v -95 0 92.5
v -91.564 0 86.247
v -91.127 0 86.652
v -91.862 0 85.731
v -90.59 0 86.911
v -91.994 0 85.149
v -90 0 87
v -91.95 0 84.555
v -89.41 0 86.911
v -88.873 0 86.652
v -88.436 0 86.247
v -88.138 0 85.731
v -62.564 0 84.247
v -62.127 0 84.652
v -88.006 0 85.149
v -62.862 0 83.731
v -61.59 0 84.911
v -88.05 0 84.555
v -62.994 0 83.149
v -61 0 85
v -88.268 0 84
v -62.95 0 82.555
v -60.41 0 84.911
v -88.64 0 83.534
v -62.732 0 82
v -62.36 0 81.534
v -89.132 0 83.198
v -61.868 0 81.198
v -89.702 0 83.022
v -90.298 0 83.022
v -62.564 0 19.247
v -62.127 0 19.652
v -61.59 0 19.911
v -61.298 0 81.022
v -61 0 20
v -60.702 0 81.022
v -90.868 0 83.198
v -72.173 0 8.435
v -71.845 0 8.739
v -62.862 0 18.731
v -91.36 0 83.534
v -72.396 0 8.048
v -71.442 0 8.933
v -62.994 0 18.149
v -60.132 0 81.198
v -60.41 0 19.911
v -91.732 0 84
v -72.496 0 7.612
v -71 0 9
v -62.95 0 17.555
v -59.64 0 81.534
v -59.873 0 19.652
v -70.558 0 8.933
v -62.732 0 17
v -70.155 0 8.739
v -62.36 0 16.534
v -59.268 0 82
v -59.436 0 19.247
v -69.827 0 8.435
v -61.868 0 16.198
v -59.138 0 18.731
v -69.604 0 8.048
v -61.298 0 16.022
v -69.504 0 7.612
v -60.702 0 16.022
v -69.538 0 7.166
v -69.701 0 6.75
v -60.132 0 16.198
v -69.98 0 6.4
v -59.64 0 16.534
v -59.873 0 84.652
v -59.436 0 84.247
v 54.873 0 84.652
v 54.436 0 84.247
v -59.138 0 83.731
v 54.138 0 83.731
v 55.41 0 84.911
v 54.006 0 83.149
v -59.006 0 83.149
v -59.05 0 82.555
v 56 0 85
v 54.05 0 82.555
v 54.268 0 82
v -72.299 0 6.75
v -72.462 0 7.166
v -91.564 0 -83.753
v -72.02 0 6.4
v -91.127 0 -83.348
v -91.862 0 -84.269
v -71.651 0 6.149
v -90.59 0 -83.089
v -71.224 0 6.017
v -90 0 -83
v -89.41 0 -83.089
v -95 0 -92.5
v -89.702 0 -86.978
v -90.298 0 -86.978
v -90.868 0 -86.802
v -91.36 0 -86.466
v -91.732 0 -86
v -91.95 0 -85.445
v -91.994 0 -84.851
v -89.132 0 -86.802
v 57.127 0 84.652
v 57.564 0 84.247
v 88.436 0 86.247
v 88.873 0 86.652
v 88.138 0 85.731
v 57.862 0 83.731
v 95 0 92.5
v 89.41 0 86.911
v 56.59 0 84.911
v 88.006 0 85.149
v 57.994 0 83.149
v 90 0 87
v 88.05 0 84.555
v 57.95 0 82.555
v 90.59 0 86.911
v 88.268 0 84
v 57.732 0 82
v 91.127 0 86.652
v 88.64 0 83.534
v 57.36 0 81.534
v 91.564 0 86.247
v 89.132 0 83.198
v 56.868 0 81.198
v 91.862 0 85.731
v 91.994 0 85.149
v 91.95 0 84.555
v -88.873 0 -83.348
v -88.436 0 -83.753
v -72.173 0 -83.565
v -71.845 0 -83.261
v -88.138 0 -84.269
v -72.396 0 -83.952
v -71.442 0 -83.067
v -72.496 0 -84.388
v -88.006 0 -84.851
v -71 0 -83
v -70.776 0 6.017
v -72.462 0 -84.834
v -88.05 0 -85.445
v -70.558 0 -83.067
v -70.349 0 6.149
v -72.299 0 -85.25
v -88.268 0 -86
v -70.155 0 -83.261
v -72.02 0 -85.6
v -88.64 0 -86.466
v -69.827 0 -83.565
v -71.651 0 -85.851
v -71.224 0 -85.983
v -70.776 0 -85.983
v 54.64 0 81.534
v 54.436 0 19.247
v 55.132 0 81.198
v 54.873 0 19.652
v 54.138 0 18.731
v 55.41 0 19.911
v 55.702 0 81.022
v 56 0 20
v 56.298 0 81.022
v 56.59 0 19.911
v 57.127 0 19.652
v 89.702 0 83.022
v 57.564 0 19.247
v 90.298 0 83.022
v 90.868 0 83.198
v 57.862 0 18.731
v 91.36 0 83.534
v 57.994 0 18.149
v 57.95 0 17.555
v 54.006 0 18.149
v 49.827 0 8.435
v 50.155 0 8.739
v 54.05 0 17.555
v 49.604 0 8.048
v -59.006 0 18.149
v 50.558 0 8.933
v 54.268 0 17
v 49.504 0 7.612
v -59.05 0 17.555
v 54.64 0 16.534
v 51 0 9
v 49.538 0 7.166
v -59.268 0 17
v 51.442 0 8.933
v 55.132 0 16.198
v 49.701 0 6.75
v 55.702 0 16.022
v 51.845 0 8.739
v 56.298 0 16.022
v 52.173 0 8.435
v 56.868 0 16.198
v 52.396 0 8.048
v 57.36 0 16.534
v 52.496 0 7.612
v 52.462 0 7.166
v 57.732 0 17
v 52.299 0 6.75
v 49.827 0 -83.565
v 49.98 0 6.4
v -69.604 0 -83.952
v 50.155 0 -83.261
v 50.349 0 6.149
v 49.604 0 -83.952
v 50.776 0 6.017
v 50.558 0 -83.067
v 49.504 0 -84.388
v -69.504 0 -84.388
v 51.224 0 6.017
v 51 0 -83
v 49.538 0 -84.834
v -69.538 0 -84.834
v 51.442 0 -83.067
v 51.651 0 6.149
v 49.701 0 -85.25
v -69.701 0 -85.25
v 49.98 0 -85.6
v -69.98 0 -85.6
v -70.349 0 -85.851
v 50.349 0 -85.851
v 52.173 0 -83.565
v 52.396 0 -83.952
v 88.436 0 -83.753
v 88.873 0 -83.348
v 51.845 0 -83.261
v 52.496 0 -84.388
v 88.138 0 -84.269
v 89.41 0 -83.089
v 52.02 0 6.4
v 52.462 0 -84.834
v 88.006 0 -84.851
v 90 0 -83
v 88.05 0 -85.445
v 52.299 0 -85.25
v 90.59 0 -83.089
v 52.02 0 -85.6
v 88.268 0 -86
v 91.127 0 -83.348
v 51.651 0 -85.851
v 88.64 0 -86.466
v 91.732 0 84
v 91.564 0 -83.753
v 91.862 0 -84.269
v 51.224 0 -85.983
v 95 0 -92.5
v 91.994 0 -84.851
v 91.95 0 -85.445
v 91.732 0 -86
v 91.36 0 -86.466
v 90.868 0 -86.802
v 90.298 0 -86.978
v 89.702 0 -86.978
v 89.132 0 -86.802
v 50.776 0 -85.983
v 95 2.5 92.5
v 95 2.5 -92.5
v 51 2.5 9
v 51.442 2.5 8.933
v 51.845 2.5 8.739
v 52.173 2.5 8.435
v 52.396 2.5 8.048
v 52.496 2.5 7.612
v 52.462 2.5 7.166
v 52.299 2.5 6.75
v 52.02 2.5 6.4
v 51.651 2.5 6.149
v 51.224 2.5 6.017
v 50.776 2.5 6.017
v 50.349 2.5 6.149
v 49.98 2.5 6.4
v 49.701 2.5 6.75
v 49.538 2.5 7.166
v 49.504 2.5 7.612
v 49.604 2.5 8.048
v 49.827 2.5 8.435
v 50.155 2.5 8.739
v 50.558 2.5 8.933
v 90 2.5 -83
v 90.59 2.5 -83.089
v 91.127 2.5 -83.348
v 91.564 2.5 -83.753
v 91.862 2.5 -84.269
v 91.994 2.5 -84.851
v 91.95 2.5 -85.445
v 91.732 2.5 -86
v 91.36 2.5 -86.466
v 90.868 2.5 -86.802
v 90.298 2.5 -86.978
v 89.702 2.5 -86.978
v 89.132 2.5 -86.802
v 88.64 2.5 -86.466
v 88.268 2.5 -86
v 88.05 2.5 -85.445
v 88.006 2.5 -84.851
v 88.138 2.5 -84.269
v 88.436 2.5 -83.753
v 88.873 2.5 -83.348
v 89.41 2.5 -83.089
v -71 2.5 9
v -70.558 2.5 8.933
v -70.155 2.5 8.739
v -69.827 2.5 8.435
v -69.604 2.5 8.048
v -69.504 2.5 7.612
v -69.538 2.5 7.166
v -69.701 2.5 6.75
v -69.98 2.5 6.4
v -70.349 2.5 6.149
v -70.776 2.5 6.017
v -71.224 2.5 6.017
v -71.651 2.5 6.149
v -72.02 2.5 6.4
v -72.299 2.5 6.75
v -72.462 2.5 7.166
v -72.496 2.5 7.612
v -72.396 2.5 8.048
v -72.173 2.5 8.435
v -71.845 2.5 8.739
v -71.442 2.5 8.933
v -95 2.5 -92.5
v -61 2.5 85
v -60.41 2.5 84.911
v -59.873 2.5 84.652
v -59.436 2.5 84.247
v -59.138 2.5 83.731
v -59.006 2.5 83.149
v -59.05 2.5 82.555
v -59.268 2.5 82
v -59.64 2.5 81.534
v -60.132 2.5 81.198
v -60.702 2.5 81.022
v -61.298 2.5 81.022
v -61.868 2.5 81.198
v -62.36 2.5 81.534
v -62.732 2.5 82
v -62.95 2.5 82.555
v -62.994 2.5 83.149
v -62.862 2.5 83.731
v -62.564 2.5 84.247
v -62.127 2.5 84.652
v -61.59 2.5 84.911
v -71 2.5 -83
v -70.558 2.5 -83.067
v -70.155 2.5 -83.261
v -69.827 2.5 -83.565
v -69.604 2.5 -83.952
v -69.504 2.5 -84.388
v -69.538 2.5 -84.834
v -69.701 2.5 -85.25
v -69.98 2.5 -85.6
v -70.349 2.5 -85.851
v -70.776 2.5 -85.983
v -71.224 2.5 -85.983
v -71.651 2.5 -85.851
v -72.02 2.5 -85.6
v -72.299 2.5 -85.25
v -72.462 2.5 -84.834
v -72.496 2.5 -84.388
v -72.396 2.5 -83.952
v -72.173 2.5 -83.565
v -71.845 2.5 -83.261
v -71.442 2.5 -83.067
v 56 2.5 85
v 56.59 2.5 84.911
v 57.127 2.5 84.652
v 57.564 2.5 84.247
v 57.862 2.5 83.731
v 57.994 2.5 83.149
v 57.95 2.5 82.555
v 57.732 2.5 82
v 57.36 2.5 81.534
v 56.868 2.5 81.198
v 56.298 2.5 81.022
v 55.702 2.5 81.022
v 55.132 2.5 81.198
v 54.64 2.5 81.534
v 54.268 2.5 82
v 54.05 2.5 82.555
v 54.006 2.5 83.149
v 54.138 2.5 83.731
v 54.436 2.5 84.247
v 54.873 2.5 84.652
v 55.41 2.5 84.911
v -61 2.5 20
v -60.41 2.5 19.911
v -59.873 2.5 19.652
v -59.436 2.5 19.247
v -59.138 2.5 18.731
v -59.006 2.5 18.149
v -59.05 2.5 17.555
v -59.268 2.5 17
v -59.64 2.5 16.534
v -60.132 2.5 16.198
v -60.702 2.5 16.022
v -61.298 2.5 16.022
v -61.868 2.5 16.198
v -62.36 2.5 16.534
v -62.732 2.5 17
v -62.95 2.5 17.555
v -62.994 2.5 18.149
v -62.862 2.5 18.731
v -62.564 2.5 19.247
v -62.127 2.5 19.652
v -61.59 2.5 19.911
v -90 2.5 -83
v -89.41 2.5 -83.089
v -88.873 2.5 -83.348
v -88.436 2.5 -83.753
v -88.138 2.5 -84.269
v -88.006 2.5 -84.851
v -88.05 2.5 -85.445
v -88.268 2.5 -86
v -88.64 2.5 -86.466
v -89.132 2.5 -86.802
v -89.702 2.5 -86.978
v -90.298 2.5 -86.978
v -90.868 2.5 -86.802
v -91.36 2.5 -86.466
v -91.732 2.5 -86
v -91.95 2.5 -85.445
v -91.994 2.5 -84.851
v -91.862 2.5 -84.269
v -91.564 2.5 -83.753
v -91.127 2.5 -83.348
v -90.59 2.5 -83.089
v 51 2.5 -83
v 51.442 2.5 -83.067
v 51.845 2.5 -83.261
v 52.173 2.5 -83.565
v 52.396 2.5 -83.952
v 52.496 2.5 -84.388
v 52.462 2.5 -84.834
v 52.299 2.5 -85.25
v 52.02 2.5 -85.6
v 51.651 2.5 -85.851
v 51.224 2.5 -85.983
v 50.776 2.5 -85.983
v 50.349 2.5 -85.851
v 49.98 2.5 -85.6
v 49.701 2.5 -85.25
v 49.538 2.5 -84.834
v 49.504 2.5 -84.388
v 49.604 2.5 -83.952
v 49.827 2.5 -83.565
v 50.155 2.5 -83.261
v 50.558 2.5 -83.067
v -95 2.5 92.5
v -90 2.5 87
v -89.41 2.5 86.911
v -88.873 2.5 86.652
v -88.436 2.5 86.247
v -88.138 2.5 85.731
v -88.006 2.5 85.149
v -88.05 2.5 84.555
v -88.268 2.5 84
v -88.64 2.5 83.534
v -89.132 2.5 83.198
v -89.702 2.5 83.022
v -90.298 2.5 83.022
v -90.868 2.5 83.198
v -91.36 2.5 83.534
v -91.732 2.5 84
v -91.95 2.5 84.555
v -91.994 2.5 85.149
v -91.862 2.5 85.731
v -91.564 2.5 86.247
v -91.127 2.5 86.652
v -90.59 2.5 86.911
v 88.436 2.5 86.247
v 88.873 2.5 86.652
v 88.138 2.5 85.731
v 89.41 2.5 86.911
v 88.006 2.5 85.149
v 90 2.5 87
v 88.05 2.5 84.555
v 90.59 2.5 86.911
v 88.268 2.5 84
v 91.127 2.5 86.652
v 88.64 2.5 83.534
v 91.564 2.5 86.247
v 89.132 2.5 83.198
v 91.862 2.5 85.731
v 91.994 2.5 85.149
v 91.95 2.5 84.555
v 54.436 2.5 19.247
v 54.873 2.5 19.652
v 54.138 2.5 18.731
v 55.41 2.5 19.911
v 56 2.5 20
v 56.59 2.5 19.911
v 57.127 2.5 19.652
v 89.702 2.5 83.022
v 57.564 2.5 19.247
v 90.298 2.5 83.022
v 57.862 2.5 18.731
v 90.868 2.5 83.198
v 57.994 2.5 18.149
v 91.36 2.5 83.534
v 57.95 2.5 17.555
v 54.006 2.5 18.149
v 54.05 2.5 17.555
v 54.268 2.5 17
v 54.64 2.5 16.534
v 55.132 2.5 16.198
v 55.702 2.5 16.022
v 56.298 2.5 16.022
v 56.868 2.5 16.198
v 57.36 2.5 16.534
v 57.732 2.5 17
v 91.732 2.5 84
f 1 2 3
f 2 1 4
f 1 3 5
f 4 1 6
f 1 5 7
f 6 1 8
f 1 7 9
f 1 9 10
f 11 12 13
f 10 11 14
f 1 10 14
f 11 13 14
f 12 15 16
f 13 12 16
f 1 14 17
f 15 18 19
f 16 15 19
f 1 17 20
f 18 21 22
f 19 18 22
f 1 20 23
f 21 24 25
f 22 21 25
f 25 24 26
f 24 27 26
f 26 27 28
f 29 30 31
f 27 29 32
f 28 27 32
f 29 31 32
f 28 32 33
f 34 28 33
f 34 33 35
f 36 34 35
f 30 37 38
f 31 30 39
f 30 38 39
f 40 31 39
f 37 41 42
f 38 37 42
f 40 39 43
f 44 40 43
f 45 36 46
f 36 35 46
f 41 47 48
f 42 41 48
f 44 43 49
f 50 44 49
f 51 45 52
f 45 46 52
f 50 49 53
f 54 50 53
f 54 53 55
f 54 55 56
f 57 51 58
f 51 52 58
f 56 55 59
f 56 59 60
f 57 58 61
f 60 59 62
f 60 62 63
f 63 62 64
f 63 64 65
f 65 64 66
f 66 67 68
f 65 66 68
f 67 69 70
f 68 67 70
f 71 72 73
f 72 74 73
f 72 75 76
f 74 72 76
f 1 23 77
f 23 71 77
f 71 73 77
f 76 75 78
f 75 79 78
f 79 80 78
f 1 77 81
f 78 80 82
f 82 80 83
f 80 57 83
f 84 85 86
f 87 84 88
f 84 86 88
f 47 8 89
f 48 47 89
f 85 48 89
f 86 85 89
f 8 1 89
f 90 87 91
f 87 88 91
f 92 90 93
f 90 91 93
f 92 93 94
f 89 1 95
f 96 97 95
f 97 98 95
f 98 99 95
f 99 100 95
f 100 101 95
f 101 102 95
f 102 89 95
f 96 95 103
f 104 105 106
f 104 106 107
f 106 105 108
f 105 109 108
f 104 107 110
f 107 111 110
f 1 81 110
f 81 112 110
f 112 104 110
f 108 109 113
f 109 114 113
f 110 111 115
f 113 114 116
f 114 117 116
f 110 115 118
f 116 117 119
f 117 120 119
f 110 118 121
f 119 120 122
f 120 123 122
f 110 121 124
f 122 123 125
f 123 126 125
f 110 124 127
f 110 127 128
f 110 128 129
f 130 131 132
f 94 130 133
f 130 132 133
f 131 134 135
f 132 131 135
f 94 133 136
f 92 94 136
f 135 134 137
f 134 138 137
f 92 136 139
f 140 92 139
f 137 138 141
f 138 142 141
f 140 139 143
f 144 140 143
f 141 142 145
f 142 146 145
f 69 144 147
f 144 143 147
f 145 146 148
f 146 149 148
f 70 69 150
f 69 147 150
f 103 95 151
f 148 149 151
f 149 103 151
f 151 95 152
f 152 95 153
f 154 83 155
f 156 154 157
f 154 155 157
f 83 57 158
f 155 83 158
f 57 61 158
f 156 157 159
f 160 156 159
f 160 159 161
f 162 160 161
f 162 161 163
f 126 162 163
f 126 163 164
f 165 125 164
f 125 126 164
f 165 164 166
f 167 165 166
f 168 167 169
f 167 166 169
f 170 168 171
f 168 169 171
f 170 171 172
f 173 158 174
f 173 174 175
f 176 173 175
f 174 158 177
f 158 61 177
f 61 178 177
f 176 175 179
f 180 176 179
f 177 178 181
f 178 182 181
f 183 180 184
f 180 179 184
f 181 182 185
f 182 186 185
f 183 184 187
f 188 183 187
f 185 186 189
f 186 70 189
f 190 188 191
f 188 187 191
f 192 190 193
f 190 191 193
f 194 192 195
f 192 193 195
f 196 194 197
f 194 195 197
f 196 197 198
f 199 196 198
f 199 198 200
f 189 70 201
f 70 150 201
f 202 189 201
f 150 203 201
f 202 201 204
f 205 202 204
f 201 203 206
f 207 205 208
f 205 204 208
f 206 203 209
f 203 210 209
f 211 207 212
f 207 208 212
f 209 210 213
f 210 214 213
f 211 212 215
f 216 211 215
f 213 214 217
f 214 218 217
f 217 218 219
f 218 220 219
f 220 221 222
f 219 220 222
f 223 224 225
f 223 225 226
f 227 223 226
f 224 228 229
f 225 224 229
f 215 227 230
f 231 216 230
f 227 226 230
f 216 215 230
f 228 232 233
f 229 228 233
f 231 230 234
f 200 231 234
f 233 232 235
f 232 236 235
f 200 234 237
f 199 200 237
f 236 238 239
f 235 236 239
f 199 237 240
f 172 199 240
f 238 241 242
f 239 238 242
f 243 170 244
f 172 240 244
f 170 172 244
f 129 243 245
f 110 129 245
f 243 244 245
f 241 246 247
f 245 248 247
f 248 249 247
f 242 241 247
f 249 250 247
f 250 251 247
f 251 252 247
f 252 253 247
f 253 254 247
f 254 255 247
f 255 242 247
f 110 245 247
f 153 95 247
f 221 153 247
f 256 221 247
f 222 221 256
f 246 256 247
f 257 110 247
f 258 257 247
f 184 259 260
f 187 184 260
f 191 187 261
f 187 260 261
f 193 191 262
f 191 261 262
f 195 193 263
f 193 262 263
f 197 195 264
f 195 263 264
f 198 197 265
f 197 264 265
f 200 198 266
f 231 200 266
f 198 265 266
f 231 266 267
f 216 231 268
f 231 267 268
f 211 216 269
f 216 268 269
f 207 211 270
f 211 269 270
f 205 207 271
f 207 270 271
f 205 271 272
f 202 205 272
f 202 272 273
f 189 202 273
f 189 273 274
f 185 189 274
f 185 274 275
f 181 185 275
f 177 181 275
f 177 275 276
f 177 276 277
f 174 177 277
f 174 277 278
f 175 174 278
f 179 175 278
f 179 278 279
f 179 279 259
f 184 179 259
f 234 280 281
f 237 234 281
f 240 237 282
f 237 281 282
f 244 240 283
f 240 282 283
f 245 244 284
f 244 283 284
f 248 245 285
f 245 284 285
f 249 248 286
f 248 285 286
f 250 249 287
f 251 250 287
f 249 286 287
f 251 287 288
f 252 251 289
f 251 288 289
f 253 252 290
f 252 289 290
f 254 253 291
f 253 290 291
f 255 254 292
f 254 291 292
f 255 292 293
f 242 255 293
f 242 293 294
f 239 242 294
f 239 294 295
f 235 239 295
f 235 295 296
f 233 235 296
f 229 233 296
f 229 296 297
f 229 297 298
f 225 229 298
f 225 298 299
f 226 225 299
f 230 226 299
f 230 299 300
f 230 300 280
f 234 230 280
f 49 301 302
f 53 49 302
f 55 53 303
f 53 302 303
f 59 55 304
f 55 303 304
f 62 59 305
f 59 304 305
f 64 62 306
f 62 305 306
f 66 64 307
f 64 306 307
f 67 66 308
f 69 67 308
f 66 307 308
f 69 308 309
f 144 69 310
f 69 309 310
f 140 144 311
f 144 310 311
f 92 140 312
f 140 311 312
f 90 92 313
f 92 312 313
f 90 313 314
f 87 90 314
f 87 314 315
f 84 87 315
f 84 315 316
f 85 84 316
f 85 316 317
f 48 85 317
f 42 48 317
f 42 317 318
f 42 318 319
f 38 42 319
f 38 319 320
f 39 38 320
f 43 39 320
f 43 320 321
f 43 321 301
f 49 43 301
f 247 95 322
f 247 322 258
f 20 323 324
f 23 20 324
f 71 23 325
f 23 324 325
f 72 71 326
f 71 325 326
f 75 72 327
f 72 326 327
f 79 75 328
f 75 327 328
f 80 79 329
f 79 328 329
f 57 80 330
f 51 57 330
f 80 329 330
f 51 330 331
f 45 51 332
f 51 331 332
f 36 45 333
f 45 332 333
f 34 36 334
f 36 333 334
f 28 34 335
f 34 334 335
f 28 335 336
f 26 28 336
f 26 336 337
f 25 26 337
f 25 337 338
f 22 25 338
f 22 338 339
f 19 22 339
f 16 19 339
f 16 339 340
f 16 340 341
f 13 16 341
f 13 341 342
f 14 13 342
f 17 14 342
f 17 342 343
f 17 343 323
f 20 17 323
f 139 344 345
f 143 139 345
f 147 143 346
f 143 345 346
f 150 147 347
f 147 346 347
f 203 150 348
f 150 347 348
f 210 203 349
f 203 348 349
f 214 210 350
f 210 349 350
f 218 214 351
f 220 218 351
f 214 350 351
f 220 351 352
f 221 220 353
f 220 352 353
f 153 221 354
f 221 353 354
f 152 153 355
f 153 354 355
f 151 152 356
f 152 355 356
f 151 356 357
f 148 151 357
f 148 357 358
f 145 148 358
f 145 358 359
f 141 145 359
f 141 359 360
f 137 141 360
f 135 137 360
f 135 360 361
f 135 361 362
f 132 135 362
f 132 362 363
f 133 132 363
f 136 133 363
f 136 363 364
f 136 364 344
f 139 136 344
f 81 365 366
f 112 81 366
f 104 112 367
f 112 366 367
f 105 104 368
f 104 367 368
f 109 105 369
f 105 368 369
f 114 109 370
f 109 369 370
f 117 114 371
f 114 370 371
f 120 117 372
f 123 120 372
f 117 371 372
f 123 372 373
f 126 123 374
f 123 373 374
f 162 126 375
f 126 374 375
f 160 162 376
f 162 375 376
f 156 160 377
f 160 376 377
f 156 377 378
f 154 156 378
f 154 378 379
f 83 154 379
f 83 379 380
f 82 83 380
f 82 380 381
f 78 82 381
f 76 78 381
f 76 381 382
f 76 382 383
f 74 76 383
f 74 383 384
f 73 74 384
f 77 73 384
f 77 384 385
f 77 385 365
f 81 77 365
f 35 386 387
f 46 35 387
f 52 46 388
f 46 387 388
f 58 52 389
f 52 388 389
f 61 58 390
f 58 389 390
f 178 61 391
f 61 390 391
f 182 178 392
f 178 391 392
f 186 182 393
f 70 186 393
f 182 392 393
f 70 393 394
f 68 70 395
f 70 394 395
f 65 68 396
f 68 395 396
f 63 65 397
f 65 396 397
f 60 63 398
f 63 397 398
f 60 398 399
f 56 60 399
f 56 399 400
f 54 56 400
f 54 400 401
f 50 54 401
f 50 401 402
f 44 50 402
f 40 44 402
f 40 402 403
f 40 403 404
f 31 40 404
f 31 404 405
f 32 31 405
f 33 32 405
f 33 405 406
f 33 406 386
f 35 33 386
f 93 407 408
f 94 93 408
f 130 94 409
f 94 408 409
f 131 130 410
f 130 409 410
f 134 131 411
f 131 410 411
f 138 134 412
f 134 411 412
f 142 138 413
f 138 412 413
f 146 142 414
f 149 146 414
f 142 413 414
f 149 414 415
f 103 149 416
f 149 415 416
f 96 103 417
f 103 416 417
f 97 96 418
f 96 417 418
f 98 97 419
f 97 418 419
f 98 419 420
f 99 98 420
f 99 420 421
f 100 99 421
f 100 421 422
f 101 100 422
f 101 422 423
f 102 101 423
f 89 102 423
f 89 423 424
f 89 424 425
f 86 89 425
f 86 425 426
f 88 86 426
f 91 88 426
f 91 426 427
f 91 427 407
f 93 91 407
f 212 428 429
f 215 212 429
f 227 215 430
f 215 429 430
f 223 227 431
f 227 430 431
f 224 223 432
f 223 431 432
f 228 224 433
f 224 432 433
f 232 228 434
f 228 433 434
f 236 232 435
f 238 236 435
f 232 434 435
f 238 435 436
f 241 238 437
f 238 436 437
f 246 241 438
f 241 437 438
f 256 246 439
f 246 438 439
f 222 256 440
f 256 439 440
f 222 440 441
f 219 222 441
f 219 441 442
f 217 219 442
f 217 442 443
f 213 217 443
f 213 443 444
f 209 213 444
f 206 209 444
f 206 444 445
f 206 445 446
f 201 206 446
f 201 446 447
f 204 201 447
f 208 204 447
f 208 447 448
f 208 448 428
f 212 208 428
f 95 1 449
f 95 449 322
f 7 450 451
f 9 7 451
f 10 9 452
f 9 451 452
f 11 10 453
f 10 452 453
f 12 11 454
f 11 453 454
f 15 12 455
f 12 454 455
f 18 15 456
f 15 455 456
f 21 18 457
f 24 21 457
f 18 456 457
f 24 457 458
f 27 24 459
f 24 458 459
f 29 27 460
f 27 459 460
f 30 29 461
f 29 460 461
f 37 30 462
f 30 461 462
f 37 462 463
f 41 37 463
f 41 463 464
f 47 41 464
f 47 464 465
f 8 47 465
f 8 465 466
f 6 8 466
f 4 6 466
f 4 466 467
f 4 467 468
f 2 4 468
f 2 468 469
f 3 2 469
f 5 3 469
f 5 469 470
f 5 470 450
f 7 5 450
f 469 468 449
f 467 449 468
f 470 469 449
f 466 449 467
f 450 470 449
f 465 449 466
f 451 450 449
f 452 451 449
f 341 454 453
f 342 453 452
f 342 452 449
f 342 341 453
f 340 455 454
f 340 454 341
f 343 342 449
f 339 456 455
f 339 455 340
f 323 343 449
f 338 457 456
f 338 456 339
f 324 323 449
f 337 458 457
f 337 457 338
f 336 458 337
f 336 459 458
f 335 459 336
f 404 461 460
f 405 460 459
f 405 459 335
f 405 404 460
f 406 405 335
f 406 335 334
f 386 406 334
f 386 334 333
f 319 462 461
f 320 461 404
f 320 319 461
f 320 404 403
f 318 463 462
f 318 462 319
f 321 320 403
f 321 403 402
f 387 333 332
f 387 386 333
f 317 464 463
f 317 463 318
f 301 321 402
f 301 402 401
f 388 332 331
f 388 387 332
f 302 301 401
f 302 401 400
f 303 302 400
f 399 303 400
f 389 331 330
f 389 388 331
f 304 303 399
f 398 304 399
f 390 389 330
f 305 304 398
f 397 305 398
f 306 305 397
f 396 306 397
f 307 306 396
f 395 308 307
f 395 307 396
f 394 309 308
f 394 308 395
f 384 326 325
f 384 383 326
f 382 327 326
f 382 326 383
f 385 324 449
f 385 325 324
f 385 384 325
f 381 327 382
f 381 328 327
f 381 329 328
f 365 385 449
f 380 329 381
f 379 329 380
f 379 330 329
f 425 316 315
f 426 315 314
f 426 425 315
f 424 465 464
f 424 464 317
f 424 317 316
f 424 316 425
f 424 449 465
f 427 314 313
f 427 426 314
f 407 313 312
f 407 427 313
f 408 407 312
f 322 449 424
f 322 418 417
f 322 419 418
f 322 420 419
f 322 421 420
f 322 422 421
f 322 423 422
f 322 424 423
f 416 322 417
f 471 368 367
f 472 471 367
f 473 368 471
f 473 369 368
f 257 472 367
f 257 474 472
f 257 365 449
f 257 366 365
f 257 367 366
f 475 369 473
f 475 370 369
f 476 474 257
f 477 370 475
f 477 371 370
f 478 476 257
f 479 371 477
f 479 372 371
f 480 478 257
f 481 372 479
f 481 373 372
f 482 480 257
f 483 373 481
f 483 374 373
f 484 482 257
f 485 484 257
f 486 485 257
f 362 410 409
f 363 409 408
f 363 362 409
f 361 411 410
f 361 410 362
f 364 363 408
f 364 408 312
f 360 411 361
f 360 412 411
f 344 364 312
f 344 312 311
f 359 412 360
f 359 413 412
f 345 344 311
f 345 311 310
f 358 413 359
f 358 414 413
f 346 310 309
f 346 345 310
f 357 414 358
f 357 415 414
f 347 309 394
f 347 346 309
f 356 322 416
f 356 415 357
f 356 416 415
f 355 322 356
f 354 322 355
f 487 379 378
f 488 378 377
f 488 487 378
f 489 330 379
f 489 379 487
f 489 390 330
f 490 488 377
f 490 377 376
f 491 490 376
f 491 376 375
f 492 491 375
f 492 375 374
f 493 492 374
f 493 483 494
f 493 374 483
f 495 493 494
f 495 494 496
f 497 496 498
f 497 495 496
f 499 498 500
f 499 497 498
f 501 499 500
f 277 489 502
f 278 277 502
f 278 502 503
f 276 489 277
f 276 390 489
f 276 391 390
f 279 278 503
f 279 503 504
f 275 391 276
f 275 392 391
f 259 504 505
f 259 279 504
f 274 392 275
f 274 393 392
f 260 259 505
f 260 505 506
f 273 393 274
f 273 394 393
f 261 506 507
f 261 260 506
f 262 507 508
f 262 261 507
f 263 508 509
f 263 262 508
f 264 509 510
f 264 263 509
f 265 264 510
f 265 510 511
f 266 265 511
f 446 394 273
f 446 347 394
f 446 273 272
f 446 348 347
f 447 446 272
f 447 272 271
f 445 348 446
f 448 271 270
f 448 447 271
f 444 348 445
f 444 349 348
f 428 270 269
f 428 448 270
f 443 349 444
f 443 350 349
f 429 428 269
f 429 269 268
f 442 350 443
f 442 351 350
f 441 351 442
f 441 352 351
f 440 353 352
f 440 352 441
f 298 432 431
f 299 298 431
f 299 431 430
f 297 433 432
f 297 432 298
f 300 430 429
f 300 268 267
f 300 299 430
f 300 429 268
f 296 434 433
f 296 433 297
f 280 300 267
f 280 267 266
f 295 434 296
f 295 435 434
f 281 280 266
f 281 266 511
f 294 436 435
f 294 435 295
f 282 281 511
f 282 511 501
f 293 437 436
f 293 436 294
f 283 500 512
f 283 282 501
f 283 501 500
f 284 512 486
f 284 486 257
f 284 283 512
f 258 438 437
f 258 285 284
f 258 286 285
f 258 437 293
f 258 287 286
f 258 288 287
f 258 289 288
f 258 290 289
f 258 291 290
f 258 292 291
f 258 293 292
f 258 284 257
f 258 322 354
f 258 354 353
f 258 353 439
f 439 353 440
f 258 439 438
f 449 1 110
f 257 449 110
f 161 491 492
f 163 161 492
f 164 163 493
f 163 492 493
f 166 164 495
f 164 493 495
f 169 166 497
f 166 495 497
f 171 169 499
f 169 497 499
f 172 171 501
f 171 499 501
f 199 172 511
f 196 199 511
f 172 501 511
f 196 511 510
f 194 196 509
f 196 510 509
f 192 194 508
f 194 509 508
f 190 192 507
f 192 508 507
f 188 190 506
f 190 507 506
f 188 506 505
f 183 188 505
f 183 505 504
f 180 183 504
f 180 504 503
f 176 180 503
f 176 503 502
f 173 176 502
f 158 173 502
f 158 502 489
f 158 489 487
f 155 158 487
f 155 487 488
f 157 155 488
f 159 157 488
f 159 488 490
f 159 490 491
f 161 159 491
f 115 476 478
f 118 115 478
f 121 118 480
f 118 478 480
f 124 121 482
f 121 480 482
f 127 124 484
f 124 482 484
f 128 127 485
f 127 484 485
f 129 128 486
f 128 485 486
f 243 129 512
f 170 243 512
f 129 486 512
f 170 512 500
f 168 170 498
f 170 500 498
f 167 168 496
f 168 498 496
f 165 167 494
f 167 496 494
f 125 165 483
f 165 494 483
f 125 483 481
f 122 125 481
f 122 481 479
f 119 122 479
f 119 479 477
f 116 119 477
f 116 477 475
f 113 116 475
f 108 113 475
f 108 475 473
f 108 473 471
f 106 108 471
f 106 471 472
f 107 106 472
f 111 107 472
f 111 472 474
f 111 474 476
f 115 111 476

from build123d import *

# Parameters (mm, degrees)
SKETCH1_W           = 190
SKETCH1_H           = 185
BOSS_EXTRUDE1_DEPTH = 2.5
SKETCH3_R           = 2
CUT_EXTRUDE2_DEPTH  = 10
SKETCH4_R           = 2
CUT_EXTRUDE3_DEPTH  = 10
SKETCH5_R           = 1.5
CUT_EXTRUDE4_DEPTH  = 10


with BuildPart() as part:
    # Sketch1 → Boss-Extrude1 (new body)
    with BuildSketch(Plane(origin=(0, 0, 0), x_dir=(1, 0, 0), z_dir=(0, 1, 0))):
        Rectangle(SKETCH1_W, SKETCH1_H)
    extrude(amount=BOSS_EXTRUDE1_DEPTH)

    # Sketch3 → Cut-Extrude2 (cut)
    with BuildSketch(Plane(origin=(0, 2.5, 0), x_dir=(1, 0, 0), z_dir=(0, 1, 0))):
        with Locations(Location((90, 85, 0), (0, 0, 270))):
            Circle(SKETCH3_R)
        with Locations(Location((-90, 85, 0), (0, 0, 270))):
            Circle(SKETCH3_R)
        with Locations(Location((-90, -85, 0), (0, 0, 270))):
            Circle(SKETCH3_R)
        with Locations(Location((90, -85, 0), (0, 0, 270))):
            Circle(SKETCH3_R)
    extrude(amount=-CUT_EXTRUDE2_DEPTH, mode=Mode.SUBTRACT)

    # Sketch4 → Cut-Extrude3 (cut)
    with BuildSketch(Plane(origin=(0, 2.5, 0), x_dir=(1, 0, 0), z_dir=(0, 1, 0))):
        with Locations(Location((56, -83, 0), (0, 0, 270))):
            Circle(SKETCH4_R)
        with Locations(Location((-61, -83, 0), (0, 0, 270))):
            Circle(SKETCH4_R)
        with Locations(Location((-61, -18, 0), (0, 0, 270))):
            Circle(SKETCH4_R)
        with Locations(Location((56, -18, 0), (0, 0, 270))):
            Circle(SKETCH4_R)
    extrude(amount=-CUT_EXTRUDE3_DEPTH, mode=Mode.SUBTRACT)

    # Sketch5 → Cut-Extrude4 (cut)
    with BuildSketch(Plane(origin=(0, 2.5, 0), x_dir=(1, 0, 0), z_dir=(0, 1, 0))):
        with Locations(Location((-71, 84.5, 0), (0, 0, 270))):
            Circle(SKETCH5_R)
        with Locations(Location((51, 84.5, 0), (0, 0, 270))):
            Circle(SKETCH5_R)
        with Locations(Location((51, -7.5, 0), (0, 0, 270))):
            Circle(SKETCH5_R)
        with Locations(Location((-71, -7.5, 0), (0, 0, 270))):
            Circle(SKETCH5_R)
    extrude(amount=-CUT_EXTRUDE4_DEPTH, mode=Mode.SUBTRACT)


solid = part.part
